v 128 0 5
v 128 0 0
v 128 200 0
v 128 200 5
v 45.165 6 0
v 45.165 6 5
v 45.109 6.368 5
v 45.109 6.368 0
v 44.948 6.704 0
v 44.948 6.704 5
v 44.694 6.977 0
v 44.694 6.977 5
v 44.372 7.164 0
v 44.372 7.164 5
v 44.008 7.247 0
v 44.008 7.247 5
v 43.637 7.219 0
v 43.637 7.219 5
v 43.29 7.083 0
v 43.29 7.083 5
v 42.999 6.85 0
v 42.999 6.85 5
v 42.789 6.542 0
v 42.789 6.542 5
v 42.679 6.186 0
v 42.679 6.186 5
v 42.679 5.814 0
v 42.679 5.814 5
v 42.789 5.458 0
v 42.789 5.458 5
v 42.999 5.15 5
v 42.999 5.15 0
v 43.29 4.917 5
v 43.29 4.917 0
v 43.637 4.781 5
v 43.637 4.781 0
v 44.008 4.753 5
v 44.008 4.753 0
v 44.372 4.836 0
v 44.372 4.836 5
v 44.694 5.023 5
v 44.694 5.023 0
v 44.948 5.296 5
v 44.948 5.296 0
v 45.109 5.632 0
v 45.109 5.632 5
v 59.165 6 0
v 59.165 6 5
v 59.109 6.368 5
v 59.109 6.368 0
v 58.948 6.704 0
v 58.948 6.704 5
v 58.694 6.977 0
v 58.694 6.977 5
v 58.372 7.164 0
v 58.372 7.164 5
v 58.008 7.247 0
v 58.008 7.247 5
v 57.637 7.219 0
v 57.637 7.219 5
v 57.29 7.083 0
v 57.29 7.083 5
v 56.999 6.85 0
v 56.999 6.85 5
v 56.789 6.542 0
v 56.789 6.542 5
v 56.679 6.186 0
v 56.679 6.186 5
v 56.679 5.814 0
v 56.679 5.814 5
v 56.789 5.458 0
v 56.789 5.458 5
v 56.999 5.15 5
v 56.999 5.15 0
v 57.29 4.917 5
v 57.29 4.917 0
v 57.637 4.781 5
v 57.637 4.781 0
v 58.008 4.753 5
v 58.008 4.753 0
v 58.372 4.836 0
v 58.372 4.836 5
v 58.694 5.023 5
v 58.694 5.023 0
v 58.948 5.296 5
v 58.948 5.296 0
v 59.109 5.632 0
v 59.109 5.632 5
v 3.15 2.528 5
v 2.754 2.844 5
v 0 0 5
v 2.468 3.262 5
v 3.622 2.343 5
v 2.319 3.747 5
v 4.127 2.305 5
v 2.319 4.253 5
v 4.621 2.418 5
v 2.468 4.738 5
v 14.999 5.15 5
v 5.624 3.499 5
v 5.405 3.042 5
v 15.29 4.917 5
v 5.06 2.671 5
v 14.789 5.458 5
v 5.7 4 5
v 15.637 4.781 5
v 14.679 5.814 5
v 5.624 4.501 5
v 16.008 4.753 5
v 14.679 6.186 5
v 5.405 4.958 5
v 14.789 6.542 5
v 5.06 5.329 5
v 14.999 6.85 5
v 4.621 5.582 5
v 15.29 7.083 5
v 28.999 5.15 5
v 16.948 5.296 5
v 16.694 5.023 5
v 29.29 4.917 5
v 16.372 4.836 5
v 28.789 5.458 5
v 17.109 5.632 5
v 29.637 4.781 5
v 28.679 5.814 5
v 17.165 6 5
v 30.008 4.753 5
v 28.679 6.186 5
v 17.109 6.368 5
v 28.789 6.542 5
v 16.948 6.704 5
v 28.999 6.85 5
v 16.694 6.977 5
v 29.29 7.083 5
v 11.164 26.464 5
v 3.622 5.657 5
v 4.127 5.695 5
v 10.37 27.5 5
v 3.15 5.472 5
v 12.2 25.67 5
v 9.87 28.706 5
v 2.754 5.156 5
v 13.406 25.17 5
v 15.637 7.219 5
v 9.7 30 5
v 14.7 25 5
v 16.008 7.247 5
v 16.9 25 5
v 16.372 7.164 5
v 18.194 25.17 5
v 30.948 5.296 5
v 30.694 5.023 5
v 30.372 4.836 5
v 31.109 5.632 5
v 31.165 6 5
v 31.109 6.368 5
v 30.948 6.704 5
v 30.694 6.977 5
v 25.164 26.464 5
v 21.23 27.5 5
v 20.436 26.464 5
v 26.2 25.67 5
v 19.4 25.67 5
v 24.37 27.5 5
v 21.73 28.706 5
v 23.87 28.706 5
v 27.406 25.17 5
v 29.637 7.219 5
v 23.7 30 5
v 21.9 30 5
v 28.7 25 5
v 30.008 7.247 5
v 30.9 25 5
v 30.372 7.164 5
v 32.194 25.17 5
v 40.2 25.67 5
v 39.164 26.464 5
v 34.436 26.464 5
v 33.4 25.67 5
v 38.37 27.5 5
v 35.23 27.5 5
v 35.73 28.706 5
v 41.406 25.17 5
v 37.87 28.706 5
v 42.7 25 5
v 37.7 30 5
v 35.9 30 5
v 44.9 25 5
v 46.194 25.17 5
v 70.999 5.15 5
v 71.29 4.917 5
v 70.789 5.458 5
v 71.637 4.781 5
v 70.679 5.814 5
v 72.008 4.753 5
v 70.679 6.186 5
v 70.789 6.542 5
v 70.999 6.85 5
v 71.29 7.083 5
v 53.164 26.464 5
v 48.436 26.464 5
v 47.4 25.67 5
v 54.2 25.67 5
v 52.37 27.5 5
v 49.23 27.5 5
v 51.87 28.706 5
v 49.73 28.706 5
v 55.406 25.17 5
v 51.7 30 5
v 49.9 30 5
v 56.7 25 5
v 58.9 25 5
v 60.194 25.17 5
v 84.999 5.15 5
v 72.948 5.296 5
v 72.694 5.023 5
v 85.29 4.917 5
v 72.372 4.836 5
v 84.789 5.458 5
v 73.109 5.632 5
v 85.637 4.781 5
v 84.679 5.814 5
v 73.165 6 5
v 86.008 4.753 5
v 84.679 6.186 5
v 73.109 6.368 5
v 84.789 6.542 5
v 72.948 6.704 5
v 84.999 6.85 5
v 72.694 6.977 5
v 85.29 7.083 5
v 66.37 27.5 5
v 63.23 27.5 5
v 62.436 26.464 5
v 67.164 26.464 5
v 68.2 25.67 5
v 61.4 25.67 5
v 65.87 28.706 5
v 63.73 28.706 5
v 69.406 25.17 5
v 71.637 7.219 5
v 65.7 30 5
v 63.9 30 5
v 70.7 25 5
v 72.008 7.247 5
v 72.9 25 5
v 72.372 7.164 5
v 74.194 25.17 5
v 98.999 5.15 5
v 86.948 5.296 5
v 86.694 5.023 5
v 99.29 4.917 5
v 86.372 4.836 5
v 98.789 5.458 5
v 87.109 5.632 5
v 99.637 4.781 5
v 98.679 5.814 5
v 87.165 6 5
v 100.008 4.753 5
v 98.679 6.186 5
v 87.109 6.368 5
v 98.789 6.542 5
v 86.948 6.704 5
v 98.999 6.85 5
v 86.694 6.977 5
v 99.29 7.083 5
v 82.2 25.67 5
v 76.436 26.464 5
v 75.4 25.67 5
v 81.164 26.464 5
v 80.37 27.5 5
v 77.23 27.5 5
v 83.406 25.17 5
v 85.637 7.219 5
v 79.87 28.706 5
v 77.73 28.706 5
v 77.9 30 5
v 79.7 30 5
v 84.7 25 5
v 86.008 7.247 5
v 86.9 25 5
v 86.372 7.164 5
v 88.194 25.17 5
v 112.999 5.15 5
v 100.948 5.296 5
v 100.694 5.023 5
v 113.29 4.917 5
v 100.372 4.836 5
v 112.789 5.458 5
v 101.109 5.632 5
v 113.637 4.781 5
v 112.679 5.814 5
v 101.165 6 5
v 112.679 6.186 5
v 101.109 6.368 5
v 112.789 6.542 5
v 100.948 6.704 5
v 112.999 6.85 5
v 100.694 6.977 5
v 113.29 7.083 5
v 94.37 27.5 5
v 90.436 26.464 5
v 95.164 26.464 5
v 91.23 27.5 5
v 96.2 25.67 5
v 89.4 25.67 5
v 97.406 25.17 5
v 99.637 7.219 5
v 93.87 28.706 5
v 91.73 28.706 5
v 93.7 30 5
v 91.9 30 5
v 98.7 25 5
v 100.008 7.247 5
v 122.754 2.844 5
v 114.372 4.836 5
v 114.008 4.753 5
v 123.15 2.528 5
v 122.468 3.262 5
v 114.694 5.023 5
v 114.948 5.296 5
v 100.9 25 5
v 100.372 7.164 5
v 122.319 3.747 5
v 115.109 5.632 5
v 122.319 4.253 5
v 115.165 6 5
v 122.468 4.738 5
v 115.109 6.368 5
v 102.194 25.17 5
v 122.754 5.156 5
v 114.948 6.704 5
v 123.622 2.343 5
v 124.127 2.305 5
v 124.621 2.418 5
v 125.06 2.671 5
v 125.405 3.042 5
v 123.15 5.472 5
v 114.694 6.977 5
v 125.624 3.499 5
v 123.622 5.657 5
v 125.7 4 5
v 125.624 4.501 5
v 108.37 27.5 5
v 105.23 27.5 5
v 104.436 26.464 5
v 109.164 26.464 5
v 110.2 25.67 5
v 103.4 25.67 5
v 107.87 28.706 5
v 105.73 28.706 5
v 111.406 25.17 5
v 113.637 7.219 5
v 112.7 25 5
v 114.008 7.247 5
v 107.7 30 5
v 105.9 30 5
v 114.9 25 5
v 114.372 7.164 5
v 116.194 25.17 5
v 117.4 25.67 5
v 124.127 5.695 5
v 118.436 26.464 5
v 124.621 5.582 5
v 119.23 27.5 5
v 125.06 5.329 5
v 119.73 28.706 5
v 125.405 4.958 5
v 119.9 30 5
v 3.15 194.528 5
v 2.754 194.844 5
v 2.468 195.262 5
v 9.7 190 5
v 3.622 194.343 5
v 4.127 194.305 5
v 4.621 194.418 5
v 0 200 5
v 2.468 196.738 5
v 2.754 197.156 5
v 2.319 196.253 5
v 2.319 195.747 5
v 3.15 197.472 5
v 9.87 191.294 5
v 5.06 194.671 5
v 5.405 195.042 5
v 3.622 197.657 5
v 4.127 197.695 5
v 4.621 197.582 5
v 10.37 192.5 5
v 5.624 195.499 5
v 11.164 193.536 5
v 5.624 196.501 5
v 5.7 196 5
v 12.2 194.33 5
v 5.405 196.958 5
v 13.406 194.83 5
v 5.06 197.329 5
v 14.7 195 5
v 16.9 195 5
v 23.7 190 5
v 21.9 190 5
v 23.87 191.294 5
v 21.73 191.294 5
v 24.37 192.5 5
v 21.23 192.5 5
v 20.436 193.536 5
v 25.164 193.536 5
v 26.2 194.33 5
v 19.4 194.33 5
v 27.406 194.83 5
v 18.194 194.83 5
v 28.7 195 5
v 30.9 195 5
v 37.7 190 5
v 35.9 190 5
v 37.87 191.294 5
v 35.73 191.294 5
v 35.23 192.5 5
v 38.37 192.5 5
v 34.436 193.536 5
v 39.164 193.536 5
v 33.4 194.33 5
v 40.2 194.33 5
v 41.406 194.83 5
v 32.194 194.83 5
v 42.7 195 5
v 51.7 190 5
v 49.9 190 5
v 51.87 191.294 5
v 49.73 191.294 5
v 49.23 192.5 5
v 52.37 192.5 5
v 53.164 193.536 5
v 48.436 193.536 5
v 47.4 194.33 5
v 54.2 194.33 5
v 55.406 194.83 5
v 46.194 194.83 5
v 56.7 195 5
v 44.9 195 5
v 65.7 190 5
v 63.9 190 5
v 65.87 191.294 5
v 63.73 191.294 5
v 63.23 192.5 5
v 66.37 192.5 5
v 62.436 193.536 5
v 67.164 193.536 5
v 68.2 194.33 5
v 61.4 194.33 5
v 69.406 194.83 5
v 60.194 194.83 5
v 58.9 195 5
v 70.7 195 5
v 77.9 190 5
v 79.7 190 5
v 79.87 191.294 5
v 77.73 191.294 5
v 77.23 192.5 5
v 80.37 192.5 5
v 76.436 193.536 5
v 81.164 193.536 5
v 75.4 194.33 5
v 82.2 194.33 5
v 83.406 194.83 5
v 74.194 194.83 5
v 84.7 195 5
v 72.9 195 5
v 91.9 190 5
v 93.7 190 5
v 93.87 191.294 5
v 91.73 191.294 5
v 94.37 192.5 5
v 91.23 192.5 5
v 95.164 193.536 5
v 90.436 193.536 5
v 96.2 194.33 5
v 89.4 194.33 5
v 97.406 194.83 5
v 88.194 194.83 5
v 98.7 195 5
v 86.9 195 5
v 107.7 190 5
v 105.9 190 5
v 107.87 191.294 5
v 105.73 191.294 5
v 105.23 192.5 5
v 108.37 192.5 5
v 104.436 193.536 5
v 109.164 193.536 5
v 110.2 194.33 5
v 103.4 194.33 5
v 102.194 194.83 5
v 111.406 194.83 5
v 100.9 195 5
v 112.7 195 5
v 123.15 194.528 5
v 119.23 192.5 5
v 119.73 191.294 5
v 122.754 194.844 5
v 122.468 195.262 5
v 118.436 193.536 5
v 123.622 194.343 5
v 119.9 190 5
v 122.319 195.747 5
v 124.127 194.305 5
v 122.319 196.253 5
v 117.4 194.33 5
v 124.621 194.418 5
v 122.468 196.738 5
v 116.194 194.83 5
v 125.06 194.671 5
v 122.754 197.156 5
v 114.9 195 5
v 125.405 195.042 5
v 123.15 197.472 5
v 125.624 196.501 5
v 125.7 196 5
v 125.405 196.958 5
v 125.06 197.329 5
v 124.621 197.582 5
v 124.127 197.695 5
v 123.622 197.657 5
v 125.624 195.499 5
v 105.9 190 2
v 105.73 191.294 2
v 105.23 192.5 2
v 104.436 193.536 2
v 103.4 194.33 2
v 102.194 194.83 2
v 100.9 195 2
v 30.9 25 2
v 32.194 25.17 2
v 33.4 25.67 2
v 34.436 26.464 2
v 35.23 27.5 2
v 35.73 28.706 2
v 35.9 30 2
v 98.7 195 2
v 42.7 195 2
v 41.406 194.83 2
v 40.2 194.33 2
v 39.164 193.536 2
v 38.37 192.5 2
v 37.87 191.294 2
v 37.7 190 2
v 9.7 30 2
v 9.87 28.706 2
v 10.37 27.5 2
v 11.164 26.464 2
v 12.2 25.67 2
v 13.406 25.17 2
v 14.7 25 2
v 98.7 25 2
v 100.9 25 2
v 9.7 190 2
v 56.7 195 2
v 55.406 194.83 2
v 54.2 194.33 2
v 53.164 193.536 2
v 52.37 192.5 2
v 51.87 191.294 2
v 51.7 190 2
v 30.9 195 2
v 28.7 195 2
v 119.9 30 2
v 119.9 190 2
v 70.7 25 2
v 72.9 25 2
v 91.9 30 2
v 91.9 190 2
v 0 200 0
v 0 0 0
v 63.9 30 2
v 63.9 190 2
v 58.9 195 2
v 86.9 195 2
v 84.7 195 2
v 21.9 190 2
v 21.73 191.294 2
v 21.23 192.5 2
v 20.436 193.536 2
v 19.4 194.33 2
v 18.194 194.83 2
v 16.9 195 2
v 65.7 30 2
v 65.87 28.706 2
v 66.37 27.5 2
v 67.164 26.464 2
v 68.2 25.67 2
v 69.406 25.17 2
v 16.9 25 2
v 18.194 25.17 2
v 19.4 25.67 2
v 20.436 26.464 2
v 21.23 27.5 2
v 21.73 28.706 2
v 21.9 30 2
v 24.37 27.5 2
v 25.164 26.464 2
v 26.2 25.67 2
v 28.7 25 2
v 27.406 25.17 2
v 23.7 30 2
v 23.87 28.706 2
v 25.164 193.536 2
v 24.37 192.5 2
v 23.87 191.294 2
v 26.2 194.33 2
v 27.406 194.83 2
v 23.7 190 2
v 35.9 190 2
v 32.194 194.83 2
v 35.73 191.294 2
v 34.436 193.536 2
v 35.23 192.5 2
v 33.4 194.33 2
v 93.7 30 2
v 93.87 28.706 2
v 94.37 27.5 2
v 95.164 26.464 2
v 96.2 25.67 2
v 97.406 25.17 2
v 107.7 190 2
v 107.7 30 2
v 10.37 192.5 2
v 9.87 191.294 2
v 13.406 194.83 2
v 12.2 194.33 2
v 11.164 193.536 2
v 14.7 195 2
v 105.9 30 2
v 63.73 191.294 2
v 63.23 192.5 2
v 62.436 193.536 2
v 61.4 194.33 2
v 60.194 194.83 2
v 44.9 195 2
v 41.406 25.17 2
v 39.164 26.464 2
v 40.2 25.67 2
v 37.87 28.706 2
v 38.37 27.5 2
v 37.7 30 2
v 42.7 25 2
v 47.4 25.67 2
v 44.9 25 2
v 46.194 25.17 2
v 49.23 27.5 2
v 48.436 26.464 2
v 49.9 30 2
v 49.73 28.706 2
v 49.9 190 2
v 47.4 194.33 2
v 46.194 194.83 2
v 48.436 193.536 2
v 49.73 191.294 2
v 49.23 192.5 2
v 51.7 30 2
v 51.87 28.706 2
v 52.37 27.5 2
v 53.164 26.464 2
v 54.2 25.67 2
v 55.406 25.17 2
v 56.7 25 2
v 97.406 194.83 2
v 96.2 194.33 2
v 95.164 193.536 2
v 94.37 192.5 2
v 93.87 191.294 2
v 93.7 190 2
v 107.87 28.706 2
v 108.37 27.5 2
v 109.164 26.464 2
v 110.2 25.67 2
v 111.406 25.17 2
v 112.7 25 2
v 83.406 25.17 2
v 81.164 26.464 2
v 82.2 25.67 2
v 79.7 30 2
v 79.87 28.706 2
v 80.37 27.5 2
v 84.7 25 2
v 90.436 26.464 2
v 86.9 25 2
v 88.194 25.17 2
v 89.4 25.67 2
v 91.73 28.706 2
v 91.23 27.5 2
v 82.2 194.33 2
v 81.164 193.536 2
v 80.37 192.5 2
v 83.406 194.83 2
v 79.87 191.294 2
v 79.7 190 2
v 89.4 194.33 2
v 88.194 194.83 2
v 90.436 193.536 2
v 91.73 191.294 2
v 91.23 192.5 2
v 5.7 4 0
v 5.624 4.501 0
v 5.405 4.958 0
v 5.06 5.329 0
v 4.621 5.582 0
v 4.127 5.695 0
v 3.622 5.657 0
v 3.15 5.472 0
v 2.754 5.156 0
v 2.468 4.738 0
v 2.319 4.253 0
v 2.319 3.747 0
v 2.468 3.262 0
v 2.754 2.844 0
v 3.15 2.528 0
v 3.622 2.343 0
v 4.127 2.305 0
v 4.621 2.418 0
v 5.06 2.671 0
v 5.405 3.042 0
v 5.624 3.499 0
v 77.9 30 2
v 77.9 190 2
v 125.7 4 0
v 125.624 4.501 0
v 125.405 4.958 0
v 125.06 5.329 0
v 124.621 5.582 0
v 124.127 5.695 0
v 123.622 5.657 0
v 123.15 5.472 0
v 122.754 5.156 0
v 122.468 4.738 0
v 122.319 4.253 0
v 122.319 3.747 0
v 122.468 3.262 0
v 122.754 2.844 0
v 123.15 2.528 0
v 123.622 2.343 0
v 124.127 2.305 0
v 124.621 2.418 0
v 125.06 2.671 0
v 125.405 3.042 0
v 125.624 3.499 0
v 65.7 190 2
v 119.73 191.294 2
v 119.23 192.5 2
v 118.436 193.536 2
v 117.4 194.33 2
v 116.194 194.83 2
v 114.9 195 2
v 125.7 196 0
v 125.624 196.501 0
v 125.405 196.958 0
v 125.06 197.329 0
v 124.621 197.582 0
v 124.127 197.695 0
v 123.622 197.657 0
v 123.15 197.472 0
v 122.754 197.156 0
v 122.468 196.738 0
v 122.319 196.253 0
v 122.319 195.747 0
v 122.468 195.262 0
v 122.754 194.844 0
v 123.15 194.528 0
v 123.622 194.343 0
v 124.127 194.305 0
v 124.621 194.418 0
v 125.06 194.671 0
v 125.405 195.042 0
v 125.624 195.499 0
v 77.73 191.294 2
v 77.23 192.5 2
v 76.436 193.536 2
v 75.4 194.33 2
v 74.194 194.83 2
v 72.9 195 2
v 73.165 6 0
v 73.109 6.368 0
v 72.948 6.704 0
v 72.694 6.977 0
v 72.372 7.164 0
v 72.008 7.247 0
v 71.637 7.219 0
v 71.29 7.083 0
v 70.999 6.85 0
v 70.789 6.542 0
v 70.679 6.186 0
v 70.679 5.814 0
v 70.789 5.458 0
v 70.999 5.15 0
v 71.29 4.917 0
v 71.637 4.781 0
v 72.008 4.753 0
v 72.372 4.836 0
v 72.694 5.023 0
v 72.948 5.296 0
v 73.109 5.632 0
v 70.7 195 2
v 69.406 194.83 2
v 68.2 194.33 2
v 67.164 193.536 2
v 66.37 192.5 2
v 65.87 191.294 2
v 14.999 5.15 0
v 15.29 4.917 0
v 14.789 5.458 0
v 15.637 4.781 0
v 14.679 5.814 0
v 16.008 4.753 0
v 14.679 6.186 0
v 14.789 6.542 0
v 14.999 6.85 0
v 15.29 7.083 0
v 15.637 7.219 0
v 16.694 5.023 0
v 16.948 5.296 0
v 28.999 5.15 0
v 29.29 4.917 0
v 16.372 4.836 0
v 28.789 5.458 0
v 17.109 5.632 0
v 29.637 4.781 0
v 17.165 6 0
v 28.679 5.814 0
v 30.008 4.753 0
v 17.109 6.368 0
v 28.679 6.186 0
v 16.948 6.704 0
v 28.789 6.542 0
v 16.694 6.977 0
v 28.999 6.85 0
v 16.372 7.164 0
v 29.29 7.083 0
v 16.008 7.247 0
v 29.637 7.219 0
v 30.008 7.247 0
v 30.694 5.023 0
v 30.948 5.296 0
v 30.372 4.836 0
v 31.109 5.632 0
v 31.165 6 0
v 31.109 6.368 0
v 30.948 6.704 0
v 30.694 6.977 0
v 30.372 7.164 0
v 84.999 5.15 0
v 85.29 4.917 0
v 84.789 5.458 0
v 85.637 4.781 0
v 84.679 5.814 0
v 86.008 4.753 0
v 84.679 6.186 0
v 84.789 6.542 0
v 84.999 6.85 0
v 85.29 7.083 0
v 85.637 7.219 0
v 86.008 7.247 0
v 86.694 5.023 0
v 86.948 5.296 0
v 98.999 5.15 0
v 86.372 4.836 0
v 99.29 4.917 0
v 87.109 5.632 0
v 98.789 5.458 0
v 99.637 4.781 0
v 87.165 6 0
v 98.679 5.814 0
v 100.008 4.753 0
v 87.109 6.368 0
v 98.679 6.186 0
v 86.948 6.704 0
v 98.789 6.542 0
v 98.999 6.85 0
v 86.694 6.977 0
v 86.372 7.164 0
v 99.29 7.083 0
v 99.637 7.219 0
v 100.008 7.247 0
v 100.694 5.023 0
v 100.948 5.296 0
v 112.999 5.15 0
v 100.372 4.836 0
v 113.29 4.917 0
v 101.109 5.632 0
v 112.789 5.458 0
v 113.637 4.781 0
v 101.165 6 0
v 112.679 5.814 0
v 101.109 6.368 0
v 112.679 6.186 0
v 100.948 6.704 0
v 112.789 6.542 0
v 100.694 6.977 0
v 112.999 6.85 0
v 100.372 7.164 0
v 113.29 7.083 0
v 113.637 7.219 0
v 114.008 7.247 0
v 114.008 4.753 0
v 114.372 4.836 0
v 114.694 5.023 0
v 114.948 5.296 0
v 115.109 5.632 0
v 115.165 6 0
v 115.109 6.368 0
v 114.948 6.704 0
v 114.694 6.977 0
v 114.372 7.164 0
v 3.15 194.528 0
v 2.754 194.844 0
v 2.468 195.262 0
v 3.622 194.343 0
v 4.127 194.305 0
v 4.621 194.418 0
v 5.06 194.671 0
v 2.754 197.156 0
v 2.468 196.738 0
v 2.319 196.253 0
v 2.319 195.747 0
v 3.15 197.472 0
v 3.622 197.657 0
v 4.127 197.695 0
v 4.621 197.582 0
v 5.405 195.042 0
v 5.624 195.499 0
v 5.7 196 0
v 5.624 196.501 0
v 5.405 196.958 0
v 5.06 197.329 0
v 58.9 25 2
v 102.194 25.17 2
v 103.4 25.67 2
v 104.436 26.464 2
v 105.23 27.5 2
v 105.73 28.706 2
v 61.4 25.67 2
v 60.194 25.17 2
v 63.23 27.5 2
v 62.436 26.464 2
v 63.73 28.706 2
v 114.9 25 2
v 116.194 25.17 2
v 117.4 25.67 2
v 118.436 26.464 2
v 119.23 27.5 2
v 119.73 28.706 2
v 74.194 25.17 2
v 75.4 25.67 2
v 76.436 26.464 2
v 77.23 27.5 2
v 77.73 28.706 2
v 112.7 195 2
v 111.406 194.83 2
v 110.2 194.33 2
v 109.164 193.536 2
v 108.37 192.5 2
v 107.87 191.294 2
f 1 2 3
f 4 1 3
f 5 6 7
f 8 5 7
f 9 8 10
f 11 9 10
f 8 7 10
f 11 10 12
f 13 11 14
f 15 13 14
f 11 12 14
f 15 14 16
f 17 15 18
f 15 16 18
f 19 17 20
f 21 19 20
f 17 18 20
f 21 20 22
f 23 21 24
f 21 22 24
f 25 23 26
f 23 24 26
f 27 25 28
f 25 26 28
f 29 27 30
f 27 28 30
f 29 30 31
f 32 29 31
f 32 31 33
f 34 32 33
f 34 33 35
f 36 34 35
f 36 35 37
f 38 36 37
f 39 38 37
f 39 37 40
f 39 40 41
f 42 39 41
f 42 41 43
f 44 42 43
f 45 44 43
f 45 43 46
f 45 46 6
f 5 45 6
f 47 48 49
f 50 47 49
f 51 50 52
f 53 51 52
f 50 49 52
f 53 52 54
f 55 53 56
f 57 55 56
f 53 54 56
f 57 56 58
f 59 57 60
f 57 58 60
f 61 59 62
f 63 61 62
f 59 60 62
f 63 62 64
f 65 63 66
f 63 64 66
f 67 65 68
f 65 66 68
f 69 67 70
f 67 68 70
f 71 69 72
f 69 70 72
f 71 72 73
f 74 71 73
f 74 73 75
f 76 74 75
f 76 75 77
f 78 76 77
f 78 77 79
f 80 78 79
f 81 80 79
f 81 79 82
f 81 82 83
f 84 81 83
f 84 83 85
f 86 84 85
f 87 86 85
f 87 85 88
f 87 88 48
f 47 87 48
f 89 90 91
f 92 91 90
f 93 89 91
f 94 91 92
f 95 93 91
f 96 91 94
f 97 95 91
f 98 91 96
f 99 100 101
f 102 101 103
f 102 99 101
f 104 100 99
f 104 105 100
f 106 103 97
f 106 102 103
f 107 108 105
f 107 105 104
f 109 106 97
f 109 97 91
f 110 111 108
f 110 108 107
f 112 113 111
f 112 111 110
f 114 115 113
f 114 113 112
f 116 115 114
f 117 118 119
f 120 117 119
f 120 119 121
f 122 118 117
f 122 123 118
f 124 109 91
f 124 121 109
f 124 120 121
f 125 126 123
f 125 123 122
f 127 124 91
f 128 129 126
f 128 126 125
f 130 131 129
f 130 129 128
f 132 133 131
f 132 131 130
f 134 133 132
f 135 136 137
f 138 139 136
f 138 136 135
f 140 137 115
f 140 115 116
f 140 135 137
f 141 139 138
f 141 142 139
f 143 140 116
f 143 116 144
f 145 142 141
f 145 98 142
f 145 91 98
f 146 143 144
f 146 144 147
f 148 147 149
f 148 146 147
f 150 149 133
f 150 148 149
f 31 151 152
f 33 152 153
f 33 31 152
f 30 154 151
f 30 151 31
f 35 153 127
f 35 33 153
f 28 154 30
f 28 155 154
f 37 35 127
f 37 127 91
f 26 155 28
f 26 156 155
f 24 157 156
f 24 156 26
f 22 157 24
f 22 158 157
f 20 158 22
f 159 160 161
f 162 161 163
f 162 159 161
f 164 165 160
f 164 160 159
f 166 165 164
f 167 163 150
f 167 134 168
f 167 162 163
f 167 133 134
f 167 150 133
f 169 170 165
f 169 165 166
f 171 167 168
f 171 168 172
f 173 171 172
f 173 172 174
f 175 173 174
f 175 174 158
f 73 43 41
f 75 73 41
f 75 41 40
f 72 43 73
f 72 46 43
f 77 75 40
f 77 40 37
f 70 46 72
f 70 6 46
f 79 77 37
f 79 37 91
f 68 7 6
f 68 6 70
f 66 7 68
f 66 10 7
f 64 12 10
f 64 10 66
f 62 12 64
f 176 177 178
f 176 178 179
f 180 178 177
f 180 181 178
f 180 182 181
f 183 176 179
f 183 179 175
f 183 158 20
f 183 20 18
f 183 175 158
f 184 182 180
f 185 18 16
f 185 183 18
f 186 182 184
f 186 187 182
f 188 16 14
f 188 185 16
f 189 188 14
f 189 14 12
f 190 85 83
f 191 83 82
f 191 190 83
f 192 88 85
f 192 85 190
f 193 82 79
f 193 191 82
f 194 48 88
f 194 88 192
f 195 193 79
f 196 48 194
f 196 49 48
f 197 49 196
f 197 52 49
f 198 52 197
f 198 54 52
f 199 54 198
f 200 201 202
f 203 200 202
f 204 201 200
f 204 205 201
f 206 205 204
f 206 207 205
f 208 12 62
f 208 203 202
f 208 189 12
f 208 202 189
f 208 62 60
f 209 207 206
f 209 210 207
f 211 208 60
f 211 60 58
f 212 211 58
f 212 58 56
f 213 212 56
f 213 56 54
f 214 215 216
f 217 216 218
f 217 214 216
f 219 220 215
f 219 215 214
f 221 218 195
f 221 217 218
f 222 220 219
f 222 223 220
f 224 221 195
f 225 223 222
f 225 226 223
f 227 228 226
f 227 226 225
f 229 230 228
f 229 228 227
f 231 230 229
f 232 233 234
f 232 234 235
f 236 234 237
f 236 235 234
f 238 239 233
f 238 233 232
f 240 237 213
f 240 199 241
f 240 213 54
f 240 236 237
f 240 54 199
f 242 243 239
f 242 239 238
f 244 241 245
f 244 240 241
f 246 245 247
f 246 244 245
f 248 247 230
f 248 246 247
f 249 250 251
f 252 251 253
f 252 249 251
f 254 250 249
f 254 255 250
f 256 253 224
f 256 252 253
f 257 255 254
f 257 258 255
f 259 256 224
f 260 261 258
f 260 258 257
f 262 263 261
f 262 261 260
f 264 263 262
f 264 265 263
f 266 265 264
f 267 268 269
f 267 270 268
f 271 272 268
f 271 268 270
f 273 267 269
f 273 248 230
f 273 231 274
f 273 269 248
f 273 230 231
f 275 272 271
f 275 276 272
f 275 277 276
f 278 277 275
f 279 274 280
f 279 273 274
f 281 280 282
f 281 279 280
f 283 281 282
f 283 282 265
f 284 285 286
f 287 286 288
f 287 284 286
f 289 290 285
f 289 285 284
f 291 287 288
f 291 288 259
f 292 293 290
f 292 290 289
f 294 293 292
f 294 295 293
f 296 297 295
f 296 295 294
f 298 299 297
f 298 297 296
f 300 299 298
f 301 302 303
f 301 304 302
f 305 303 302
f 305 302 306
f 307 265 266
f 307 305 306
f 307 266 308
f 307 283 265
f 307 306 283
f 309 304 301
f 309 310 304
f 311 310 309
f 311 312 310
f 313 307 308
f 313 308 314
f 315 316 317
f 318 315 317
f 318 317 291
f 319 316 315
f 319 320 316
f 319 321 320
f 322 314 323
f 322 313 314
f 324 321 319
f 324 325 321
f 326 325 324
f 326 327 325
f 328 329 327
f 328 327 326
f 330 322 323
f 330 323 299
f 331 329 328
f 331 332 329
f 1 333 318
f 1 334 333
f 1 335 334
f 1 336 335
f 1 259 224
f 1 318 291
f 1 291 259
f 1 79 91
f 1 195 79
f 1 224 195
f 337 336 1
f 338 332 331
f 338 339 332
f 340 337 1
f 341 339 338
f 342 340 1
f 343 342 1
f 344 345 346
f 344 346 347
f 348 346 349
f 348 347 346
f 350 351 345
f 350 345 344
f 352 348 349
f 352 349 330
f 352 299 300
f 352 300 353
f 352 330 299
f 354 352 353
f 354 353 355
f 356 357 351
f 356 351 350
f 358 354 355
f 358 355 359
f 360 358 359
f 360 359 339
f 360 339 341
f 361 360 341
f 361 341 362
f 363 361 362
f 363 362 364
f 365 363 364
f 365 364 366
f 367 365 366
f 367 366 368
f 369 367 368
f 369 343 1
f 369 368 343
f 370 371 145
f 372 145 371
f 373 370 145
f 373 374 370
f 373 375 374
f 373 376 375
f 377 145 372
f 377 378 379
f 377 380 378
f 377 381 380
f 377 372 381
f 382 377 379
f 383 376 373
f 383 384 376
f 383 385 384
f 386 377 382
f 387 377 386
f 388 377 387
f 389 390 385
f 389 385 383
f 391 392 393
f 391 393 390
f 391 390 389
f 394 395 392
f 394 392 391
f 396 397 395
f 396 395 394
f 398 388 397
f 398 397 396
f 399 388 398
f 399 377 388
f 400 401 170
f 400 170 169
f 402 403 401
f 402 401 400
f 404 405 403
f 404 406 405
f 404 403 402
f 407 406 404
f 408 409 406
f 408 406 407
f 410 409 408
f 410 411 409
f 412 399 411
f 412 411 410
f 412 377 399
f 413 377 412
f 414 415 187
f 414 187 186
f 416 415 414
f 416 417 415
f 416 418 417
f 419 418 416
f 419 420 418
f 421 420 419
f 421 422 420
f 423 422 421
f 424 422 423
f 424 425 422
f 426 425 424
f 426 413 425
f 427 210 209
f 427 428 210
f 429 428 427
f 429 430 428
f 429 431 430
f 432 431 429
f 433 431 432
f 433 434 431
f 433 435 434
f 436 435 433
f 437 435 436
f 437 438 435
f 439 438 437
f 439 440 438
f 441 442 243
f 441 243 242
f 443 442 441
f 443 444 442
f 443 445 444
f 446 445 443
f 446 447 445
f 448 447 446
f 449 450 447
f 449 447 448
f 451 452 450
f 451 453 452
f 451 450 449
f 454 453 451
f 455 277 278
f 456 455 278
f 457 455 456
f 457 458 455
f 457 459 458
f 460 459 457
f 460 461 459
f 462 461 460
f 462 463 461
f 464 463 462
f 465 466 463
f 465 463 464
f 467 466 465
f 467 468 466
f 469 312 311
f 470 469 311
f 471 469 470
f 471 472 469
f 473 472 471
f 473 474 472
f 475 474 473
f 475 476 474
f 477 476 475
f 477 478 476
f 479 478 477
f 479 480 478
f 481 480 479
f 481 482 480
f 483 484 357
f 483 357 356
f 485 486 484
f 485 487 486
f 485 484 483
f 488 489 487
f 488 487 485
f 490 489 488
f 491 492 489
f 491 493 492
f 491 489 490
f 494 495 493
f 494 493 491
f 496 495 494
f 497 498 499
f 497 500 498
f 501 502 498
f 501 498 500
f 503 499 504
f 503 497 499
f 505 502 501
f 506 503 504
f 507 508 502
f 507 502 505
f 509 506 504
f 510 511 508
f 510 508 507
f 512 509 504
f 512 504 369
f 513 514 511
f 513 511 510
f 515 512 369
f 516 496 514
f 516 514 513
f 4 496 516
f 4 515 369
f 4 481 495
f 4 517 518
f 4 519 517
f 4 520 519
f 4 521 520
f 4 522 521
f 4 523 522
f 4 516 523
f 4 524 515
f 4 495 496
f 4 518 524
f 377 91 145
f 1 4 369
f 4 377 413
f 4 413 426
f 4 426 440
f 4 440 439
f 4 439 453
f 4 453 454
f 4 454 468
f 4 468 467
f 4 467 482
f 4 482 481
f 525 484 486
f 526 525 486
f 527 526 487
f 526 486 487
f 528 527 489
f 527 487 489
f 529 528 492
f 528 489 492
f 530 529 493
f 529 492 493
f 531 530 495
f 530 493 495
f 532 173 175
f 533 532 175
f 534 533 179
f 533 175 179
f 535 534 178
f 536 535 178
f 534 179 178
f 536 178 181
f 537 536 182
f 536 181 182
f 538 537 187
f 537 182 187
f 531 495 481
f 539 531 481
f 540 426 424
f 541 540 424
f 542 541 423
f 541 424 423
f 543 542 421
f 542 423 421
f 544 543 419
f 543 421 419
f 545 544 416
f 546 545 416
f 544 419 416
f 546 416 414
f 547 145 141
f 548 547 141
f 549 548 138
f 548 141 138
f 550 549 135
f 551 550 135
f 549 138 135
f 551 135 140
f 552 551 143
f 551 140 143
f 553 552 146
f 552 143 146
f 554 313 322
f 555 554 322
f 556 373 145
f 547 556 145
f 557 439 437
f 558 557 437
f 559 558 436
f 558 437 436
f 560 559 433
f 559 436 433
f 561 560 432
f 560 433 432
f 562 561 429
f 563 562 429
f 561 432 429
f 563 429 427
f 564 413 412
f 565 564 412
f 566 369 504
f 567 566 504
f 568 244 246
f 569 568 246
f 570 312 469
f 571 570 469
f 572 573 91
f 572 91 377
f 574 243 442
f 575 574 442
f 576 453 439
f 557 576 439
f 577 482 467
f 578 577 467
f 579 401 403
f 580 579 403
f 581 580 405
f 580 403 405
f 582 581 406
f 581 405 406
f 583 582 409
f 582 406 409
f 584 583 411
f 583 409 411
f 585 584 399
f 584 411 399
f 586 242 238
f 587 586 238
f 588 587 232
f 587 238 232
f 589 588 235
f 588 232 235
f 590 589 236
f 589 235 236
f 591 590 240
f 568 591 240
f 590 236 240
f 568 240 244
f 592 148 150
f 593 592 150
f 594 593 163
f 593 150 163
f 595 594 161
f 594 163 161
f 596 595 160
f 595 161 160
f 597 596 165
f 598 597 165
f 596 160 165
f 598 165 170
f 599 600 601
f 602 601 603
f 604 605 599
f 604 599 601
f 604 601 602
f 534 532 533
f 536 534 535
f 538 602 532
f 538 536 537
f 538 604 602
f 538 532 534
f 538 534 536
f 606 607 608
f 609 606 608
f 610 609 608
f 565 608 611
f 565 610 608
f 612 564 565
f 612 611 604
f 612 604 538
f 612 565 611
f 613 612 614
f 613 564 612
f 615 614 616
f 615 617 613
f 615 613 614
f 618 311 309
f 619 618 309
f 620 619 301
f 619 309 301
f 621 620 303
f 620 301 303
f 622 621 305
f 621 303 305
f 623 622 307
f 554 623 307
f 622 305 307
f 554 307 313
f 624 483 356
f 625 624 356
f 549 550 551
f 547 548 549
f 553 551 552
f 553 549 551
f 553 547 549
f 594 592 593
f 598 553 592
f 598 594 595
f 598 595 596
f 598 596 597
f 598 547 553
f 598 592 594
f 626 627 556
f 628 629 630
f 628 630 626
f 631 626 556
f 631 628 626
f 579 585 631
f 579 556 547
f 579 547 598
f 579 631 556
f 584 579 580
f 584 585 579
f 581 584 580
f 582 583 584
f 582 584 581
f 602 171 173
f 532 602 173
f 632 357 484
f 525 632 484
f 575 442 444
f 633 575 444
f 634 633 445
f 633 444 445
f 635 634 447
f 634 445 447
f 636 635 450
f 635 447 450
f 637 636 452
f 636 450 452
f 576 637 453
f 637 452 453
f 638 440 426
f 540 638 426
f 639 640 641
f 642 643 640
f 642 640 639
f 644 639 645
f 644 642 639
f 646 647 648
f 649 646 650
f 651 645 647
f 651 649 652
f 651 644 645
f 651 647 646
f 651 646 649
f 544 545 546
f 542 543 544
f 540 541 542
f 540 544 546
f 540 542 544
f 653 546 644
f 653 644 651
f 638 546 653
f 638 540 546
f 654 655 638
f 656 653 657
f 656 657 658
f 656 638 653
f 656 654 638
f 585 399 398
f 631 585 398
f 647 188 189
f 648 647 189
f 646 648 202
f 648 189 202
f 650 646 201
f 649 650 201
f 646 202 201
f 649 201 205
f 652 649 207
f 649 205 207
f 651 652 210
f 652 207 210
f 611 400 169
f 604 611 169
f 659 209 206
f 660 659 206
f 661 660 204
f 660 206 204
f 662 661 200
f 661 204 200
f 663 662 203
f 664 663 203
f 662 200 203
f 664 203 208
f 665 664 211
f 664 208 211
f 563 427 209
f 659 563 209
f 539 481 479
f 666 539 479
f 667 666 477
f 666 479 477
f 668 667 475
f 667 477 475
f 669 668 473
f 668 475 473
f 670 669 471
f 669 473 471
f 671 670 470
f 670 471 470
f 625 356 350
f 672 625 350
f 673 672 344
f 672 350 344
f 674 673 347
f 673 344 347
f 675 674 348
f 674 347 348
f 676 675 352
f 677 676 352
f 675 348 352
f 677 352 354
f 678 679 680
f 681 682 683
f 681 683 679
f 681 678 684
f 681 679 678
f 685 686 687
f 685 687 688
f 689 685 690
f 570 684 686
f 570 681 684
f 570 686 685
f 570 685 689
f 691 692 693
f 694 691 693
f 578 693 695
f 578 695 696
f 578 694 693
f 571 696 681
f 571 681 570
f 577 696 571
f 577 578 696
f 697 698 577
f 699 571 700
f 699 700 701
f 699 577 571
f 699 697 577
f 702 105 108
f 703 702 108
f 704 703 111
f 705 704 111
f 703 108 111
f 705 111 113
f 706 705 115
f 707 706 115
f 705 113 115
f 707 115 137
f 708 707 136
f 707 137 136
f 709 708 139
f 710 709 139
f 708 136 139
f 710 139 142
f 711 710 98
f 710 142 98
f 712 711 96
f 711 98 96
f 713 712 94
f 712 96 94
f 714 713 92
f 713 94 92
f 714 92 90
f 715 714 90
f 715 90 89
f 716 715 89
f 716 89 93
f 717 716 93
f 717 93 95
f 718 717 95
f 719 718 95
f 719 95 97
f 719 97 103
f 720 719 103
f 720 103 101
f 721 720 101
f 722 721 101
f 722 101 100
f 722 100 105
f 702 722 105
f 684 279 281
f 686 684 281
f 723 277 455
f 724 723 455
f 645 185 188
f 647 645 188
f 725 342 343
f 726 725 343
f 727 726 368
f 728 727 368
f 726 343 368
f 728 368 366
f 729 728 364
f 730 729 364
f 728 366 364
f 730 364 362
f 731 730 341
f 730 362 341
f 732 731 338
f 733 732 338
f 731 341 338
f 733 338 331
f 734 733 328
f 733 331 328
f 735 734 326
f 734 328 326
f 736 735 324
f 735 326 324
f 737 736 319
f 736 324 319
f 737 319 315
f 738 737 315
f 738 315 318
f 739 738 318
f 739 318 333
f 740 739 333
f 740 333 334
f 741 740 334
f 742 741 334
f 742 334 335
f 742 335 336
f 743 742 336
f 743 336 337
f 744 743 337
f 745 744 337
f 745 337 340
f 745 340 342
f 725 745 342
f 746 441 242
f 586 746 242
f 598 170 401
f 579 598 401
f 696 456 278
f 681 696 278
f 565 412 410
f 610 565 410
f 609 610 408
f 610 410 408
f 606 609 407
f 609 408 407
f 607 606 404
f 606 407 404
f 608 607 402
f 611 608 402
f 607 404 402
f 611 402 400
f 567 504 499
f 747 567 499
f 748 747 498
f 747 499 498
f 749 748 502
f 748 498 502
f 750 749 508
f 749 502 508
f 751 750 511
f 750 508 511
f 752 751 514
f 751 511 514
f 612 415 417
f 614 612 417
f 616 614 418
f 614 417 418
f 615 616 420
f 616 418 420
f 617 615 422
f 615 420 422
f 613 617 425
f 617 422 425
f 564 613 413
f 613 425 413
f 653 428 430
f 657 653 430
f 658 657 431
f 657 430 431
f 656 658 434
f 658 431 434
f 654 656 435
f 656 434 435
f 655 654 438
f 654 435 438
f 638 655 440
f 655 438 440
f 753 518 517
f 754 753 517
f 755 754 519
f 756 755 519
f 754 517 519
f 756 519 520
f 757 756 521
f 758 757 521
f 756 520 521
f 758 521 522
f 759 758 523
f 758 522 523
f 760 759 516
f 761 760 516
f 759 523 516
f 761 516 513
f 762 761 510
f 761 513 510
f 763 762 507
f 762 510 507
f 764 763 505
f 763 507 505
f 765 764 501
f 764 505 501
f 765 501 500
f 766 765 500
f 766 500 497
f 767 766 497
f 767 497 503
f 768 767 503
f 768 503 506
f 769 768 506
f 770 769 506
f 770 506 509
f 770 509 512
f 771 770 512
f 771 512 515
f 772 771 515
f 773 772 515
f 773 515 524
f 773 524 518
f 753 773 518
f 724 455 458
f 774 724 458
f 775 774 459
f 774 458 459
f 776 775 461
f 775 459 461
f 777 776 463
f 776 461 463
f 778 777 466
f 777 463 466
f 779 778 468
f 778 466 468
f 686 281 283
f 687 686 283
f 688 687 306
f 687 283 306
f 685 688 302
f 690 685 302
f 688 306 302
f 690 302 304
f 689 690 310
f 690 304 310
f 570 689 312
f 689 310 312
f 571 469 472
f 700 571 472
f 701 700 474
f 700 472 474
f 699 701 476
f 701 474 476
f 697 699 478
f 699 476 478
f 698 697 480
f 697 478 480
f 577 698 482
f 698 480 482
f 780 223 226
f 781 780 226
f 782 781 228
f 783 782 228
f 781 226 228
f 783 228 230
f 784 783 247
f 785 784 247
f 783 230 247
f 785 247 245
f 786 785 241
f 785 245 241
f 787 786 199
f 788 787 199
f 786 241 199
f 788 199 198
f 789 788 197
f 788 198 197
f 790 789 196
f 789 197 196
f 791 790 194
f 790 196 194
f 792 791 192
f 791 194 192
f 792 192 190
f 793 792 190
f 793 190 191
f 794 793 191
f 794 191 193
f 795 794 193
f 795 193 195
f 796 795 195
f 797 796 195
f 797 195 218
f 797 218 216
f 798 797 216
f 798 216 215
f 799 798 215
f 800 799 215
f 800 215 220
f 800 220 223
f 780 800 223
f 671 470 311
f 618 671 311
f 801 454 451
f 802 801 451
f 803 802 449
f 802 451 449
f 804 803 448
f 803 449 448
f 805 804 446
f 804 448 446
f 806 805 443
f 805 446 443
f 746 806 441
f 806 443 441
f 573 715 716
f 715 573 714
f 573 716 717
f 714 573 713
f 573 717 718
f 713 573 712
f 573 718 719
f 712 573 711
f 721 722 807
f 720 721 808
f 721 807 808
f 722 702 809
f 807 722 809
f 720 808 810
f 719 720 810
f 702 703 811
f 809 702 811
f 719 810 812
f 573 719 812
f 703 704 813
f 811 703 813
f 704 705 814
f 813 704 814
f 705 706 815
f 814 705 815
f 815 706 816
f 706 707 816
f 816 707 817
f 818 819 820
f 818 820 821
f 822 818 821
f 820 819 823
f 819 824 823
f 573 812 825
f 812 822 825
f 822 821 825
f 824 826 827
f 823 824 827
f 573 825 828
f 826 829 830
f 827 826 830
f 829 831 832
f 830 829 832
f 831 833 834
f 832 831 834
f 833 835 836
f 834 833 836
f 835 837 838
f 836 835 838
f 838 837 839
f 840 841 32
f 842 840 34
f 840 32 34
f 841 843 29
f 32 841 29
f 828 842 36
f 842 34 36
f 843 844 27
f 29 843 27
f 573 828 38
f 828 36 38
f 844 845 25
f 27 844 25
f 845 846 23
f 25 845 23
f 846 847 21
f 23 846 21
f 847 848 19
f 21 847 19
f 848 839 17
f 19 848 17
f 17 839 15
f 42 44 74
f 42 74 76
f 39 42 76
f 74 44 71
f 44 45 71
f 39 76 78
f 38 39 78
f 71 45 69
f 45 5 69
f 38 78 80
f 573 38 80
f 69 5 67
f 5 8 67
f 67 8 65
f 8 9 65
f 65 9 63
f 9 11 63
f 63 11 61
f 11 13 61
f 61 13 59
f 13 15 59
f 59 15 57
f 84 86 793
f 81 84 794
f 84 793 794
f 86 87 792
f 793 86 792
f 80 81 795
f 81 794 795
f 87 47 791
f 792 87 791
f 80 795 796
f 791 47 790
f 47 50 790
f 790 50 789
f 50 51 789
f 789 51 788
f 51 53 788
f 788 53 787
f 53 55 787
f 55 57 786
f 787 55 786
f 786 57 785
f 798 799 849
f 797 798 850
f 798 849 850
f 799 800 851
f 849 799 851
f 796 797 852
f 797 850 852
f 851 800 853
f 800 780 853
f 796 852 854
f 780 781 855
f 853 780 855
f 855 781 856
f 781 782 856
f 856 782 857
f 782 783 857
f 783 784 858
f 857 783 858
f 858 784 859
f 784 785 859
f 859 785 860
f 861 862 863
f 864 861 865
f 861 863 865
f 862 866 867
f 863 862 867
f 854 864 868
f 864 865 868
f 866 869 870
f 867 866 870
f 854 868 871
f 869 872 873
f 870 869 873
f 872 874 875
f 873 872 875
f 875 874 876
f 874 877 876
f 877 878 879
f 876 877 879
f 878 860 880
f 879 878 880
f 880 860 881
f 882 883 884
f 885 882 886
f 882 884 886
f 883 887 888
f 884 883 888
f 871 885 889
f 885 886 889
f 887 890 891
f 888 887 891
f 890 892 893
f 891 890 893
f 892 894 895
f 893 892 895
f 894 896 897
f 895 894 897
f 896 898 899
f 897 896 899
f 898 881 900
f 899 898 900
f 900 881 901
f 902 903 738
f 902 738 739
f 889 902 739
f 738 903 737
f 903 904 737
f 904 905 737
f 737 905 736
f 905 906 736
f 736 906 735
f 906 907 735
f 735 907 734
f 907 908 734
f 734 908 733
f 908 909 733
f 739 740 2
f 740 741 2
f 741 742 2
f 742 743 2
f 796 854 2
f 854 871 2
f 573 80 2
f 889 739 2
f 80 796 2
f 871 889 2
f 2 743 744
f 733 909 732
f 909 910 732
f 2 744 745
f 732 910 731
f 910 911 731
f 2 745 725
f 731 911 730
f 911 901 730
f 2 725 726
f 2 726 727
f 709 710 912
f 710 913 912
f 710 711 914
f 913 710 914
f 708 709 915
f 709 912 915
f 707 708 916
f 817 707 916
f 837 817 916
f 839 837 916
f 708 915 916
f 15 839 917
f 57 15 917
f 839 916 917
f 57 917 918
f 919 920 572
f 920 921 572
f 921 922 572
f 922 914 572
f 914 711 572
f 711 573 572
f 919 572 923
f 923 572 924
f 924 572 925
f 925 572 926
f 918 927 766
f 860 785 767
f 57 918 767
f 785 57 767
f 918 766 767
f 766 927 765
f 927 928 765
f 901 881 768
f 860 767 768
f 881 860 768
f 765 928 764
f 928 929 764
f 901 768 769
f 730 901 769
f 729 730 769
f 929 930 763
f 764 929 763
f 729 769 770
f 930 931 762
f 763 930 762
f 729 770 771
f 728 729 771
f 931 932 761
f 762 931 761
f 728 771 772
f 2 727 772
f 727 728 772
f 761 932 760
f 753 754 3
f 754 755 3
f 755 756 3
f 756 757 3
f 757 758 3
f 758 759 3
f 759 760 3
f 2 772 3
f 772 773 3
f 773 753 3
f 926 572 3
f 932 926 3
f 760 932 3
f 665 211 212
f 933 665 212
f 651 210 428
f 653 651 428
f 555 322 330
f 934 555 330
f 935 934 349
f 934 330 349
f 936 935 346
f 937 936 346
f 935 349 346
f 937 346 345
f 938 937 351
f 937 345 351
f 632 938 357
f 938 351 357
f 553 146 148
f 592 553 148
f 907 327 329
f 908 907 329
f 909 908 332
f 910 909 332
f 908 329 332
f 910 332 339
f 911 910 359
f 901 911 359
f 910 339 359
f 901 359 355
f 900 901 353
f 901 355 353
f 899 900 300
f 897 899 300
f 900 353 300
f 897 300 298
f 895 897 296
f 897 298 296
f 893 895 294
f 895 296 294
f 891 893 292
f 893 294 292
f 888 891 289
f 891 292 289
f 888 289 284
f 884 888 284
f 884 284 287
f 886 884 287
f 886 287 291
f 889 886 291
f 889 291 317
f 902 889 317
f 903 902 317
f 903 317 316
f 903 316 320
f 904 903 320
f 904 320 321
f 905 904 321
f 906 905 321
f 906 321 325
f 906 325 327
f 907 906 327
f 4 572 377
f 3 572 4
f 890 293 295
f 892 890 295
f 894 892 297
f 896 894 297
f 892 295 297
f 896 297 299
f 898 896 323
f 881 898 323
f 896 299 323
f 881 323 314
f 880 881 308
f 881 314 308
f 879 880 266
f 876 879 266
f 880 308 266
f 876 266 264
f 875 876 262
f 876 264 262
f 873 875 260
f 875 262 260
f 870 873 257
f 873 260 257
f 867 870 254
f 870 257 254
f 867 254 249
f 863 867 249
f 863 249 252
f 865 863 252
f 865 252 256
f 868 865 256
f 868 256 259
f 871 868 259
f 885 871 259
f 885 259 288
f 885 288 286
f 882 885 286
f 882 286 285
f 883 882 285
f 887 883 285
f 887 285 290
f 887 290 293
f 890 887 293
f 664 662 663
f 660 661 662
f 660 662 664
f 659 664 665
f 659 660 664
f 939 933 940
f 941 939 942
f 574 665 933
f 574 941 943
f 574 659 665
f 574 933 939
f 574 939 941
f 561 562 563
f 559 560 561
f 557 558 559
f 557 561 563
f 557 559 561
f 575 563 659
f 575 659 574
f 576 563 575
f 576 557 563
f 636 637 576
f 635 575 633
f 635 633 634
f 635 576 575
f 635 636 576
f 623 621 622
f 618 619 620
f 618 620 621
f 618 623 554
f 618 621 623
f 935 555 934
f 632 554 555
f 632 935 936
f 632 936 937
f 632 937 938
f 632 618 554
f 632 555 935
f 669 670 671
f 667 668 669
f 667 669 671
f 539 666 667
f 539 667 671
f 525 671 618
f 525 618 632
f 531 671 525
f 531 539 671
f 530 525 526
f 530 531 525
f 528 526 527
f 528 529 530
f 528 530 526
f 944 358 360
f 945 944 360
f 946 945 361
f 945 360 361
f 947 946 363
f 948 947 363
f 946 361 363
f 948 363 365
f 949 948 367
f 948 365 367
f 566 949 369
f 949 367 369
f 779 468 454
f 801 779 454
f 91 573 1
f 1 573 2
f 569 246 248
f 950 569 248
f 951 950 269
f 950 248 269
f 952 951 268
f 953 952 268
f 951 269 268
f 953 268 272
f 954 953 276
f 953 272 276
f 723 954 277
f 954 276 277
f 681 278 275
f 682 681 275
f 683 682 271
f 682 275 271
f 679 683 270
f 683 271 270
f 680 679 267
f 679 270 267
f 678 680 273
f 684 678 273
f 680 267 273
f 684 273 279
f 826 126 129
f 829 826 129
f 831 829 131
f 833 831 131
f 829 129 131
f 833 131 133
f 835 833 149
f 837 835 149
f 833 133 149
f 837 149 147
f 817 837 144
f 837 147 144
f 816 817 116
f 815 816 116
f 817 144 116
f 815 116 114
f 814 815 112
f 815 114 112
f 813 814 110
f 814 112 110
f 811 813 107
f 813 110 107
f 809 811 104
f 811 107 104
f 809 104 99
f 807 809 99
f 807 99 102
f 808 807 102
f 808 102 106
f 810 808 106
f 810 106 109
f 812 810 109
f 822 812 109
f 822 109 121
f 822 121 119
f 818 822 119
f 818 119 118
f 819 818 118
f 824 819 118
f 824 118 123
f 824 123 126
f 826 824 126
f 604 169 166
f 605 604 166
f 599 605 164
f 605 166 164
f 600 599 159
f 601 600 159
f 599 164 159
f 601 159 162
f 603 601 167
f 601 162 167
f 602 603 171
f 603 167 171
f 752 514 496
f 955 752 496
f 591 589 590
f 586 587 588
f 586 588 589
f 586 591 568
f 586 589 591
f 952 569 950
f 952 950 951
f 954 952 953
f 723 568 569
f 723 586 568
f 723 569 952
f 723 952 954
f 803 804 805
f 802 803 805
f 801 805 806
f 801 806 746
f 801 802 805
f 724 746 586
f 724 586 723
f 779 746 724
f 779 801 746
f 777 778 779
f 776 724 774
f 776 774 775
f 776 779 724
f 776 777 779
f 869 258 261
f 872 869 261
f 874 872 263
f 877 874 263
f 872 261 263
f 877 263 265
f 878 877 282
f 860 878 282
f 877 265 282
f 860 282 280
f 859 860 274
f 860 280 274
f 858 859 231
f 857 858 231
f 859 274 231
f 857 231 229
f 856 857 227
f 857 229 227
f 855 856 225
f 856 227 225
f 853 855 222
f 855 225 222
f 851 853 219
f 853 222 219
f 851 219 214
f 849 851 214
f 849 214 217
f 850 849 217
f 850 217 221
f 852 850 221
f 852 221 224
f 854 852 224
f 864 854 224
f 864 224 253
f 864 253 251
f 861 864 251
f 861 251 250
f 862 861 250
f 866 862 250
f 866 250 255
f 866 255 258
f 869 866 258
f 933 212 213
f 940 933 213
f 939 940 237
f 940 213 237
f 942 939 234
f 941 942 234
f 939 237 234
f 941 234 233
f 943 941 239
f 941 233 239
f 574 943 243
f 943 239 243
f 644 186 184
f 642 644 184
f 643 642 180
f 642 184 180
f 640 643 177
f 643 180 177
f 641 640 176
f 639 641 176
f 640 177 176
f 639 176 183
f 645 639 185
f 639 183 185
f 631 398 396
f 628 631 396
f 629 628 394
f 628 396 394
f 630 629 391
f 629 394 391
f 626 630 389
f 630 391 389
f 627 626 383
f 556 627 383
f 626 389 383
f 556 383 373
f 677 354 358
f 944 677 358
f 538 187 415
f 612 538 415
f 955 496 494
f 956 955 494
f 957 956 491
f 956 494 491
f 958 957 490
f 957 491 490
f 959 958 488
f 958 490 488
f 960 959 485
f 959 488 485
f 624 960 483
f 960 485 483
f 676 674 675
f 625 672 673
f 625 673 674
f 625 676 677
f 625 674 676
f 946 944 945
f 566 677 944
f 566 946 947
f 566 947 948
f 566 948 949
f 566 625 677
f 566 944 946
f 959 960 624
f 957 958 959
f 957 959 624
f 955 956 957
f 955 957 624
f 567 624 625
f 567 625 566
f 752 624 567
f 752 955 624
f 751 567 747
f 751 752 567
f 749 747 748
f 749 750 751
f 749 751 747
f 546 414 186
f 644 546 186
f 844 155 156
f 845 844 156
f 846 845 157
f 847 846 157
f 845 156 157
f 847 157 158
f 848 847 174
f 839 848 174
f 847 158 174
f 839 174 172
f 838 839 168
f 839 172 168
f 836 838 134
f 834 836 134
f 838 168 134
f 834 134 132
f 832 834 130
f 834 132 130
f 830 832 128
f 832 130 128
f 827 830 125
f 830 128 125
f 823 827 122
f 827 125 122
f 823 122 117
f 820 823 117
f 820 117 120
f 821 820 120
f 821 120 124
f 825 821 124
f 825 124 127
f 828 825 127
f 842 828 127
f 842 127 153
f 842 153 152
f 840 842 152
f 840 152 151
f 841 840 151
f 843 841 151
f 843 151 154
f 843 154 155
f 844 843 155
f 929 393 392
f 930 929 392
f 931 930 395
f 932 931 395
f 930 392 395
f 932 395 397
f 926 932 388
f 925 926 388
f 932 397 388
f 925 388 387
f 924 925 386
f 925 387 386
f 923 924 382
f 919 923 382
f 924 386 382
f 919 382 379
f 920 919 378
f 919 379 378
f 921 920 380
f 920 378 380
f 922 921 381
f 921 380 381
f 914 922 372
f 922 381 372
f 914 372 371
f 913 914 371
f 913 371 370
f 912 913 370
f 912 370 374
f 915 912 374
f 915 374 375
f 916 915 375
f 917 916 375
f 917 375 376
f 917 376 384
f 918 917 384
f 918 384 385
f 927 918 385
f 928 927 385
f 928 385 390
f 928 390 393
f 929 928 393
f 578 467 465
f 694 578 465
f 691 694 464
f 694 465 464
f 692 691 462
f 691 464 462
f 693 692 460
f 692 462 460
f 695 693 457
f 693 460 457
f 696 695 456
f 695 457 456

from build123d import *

# Parameters (mm, degrees)
F0_W     = 128
F0_H     = 200
F1_DEPTH = 5
F2_R     = 1.25
F2_R_2   = 1.7
F3_DEPTH = 25
F5_DEPTH = 3


with BuildPart() as f1:
    # F0 (on Top) → F1 (new body)
    with BuildSketch(Plane.XY):
        with Locations((64, 100)):
            Rectangle(F0_W, F0_H)
    extrude(amount=F1_DEPTH)

    # F2 (on face) → F3 (cut)
    with BuildSketch(Plane.XY.offset(5)):
        with Locations((113.915, 6)):
            Circle(F2_R)
        with Locations((4, 196)):
            Circle(F2_R_2)
        with Locations((124, 196)):
            Circle(F2_R_2)
        with Locations((4, 4)):
            Circle(F2_R_2)
        with Locations((124, 4)):
            Circle(F2_R_2)
        with Locations((43.915, 6)):
            Circle(F2_R)
        with Locations((85.915, 6)):
            Circle(F2_R)
        with Locations((71.915, 6)):
            Circle(F2_R)
        with Locations((29.915, 6)):
            Circle(F2_R)
        with Locations((15.915, 6)):
            Circle(F2_R)
        with Locations((57.915, 6)):
            Circle(F2_R)
        with Locations((99.915, 6)):
            Circle(F2_R)
    extrude(amount=-F3_DEPTH, mode=Mode.SUBTRACT)

    # F4 (on face) → F5 (cut)
    with BuildSketch(Plane.XY.offset(5)):
        with BuildLine():
            ThreePointArc((119.9, 190), (118.435534, 193.535534), (114.9, 195))
            Line((114.9, 195), (112.7, 195))
            ThreePointArc((112.7, 195), (109.164466, 193.535534), (107.7, 190))
            Line((107.7, 190), (107.7, 30))
            ThreePointArc((107.7, 30), (109.164466, 26.464466), (112.7, 25))
            Line((112.7, 25), (114.9, 25))
            ThreePointArc((114.9, 25), (118.435534, 26.464466), (119.9, 30))
            Line((119.9, 30), (119.9, 190))
        make_face()
        with BuildLine():
            ThreePointArc((105.9, 190), (104.435534, 193.535534), (100.9, 195))
            Line((100.9, 195), (98.7, 195))
            ThreePointArc((98.7, 195), (95.164466, 193.535534), (93.7, 190))
            Line((93.7, 190), (93.7, 30))
            ThreePointArc((93.7, 30), (95.164466, 26.464466), (98.7, 25))
            Line((98.7, 25), (100.9, 25))
            ThreePointArc((100.9, 25), (104.435534, 26.464466), (105.9, 30))
            Line((105.9, 30), (105.9, 190))
        make_face()
        with BuildLine():
            Line((86.9, 195), (84.7, 195))
            ThreePointArc((84.7, 195), (81.164466, 193.535534), (79.7, 190))
            Line((79.7, 190), (79.7, 30))
            ThreePointArc((79.7, 30), (81.164466, 26.464466), (84.7, 25))
            Line((84.7, 25), (86.9, 25))
            ThreePointArc((86.9, 25), (90.435534, 26.464466), (91.9, 30))
            Line((91.9, 30), (91.9, 190))
            ThreePointArc((91.9, 190), (90.435534, 193.535534), (86.9, 195))
        make_face()
        with BuildLine():
            Line((72.9, 195), (70.7, 195))
            ThreePointArc((70.7, 195), (67.164466, 193.535534), (65.7, 190))
            Line((65.7, 190), (65.7, 30))
            ThreePointArc((65.7, 30), (67.164466, 26.464466), (70.7, 25))
            Line((70.7, 25), (72.9, 25))
            ThreePointArc((72.9, 25), (76.435534, 26.464466), (77.9, 30))
            Line((77.9, 30), (77.9, 190))
            ThreePointArc((77.9, 190), (76.435534, 193.535534), (72.9, 195))
        make_face()
        with BuildLine():
            Line((58.9, 195), (56.7, 195))
            ThreePointArc((56.7, 195), (53.164466, 193.535534), (51.7, 190))
            Line((51.7, 190), (51.7, 30))
            ThreePointArc((51.7, 30), (53.164466, 26.464466), (56.7, 25))
            Line((56.7, 25), (58.9, 25))
            ThreePointArc((58.9, 25), (62.435534, 26.464466), (63.9, 30))
            Line((63.9, 30), (63.9, 190))
            ThreePointArc((63.9, 190), (62.435534, 193.535534), (58.9, 195))
        make_face()
        with BuildLine():
            Line((44.9, 195), (42.7, 195))
            ThreePointArc((42.7, 195), (39.164466, 193.535534), (37.7, 190))
            Line((37.7, 190), (37.7, 30))
            ThreePointArc((37.7, 30), (39.164466, 26.464466), (42.7, 25))
            Line((42.7, 25), (44.9, 25))
            ThreePointArc((44.9, 25), (48.435534, 26.464466), (49.9, 30))
            Line((49.9, 30), (49.9, 190))
            ThreePointArc((49.9, 190), (48.435534, 193.535534), (44.9, 195))
        make_face()
        with BuildLine():
            Line((30.9, 195), (28.7, 195))
            ThreePointArc((28.7, 195), (25.164466, 193.535534), (23.7, 190))
            Line((23.7, 190), (23.7, 30))
            ThreePointArc((23.7, 30), (25.164466, 26.464466), (28.7, 25))
            Line((28.7, 25), (30.9, 25))
            ThreePointArc((30.9, 25), (34.435534, 26.464466), (35.9, 30))
            Line((35.9, 30), (35.9, 190))
            ThreePointArc((35.9, 190), (34.435534, 193.535534), (30.9, 195))
        make_face()
        with BuildLine():
            Line((16.9, 195), (14.7, 195))
            ThreePointArc((14.7, 195), (11.164466, 193.535534), (9.7, 190))
            Line((9.7, 190), (9.7, 30))
            ThreePointArc((9.7, 30), (11.164466, 26.464466), (14.7, 25))
            Line((14.7, 25), (16.9, 25))
            ThreePointArc((16.9, 25), (20.435534, 26.464466), (21.9, 30))
            Line((21.9, 30), (21.9, 190))
            ThreePointArc((21.9, 190), (20.435534, 193.535534), (16.9, 195))
        make_face()
    extrude(amount=-F5_DEPTH, mode=Mode.SUBTRACT)


solid = f1.part
